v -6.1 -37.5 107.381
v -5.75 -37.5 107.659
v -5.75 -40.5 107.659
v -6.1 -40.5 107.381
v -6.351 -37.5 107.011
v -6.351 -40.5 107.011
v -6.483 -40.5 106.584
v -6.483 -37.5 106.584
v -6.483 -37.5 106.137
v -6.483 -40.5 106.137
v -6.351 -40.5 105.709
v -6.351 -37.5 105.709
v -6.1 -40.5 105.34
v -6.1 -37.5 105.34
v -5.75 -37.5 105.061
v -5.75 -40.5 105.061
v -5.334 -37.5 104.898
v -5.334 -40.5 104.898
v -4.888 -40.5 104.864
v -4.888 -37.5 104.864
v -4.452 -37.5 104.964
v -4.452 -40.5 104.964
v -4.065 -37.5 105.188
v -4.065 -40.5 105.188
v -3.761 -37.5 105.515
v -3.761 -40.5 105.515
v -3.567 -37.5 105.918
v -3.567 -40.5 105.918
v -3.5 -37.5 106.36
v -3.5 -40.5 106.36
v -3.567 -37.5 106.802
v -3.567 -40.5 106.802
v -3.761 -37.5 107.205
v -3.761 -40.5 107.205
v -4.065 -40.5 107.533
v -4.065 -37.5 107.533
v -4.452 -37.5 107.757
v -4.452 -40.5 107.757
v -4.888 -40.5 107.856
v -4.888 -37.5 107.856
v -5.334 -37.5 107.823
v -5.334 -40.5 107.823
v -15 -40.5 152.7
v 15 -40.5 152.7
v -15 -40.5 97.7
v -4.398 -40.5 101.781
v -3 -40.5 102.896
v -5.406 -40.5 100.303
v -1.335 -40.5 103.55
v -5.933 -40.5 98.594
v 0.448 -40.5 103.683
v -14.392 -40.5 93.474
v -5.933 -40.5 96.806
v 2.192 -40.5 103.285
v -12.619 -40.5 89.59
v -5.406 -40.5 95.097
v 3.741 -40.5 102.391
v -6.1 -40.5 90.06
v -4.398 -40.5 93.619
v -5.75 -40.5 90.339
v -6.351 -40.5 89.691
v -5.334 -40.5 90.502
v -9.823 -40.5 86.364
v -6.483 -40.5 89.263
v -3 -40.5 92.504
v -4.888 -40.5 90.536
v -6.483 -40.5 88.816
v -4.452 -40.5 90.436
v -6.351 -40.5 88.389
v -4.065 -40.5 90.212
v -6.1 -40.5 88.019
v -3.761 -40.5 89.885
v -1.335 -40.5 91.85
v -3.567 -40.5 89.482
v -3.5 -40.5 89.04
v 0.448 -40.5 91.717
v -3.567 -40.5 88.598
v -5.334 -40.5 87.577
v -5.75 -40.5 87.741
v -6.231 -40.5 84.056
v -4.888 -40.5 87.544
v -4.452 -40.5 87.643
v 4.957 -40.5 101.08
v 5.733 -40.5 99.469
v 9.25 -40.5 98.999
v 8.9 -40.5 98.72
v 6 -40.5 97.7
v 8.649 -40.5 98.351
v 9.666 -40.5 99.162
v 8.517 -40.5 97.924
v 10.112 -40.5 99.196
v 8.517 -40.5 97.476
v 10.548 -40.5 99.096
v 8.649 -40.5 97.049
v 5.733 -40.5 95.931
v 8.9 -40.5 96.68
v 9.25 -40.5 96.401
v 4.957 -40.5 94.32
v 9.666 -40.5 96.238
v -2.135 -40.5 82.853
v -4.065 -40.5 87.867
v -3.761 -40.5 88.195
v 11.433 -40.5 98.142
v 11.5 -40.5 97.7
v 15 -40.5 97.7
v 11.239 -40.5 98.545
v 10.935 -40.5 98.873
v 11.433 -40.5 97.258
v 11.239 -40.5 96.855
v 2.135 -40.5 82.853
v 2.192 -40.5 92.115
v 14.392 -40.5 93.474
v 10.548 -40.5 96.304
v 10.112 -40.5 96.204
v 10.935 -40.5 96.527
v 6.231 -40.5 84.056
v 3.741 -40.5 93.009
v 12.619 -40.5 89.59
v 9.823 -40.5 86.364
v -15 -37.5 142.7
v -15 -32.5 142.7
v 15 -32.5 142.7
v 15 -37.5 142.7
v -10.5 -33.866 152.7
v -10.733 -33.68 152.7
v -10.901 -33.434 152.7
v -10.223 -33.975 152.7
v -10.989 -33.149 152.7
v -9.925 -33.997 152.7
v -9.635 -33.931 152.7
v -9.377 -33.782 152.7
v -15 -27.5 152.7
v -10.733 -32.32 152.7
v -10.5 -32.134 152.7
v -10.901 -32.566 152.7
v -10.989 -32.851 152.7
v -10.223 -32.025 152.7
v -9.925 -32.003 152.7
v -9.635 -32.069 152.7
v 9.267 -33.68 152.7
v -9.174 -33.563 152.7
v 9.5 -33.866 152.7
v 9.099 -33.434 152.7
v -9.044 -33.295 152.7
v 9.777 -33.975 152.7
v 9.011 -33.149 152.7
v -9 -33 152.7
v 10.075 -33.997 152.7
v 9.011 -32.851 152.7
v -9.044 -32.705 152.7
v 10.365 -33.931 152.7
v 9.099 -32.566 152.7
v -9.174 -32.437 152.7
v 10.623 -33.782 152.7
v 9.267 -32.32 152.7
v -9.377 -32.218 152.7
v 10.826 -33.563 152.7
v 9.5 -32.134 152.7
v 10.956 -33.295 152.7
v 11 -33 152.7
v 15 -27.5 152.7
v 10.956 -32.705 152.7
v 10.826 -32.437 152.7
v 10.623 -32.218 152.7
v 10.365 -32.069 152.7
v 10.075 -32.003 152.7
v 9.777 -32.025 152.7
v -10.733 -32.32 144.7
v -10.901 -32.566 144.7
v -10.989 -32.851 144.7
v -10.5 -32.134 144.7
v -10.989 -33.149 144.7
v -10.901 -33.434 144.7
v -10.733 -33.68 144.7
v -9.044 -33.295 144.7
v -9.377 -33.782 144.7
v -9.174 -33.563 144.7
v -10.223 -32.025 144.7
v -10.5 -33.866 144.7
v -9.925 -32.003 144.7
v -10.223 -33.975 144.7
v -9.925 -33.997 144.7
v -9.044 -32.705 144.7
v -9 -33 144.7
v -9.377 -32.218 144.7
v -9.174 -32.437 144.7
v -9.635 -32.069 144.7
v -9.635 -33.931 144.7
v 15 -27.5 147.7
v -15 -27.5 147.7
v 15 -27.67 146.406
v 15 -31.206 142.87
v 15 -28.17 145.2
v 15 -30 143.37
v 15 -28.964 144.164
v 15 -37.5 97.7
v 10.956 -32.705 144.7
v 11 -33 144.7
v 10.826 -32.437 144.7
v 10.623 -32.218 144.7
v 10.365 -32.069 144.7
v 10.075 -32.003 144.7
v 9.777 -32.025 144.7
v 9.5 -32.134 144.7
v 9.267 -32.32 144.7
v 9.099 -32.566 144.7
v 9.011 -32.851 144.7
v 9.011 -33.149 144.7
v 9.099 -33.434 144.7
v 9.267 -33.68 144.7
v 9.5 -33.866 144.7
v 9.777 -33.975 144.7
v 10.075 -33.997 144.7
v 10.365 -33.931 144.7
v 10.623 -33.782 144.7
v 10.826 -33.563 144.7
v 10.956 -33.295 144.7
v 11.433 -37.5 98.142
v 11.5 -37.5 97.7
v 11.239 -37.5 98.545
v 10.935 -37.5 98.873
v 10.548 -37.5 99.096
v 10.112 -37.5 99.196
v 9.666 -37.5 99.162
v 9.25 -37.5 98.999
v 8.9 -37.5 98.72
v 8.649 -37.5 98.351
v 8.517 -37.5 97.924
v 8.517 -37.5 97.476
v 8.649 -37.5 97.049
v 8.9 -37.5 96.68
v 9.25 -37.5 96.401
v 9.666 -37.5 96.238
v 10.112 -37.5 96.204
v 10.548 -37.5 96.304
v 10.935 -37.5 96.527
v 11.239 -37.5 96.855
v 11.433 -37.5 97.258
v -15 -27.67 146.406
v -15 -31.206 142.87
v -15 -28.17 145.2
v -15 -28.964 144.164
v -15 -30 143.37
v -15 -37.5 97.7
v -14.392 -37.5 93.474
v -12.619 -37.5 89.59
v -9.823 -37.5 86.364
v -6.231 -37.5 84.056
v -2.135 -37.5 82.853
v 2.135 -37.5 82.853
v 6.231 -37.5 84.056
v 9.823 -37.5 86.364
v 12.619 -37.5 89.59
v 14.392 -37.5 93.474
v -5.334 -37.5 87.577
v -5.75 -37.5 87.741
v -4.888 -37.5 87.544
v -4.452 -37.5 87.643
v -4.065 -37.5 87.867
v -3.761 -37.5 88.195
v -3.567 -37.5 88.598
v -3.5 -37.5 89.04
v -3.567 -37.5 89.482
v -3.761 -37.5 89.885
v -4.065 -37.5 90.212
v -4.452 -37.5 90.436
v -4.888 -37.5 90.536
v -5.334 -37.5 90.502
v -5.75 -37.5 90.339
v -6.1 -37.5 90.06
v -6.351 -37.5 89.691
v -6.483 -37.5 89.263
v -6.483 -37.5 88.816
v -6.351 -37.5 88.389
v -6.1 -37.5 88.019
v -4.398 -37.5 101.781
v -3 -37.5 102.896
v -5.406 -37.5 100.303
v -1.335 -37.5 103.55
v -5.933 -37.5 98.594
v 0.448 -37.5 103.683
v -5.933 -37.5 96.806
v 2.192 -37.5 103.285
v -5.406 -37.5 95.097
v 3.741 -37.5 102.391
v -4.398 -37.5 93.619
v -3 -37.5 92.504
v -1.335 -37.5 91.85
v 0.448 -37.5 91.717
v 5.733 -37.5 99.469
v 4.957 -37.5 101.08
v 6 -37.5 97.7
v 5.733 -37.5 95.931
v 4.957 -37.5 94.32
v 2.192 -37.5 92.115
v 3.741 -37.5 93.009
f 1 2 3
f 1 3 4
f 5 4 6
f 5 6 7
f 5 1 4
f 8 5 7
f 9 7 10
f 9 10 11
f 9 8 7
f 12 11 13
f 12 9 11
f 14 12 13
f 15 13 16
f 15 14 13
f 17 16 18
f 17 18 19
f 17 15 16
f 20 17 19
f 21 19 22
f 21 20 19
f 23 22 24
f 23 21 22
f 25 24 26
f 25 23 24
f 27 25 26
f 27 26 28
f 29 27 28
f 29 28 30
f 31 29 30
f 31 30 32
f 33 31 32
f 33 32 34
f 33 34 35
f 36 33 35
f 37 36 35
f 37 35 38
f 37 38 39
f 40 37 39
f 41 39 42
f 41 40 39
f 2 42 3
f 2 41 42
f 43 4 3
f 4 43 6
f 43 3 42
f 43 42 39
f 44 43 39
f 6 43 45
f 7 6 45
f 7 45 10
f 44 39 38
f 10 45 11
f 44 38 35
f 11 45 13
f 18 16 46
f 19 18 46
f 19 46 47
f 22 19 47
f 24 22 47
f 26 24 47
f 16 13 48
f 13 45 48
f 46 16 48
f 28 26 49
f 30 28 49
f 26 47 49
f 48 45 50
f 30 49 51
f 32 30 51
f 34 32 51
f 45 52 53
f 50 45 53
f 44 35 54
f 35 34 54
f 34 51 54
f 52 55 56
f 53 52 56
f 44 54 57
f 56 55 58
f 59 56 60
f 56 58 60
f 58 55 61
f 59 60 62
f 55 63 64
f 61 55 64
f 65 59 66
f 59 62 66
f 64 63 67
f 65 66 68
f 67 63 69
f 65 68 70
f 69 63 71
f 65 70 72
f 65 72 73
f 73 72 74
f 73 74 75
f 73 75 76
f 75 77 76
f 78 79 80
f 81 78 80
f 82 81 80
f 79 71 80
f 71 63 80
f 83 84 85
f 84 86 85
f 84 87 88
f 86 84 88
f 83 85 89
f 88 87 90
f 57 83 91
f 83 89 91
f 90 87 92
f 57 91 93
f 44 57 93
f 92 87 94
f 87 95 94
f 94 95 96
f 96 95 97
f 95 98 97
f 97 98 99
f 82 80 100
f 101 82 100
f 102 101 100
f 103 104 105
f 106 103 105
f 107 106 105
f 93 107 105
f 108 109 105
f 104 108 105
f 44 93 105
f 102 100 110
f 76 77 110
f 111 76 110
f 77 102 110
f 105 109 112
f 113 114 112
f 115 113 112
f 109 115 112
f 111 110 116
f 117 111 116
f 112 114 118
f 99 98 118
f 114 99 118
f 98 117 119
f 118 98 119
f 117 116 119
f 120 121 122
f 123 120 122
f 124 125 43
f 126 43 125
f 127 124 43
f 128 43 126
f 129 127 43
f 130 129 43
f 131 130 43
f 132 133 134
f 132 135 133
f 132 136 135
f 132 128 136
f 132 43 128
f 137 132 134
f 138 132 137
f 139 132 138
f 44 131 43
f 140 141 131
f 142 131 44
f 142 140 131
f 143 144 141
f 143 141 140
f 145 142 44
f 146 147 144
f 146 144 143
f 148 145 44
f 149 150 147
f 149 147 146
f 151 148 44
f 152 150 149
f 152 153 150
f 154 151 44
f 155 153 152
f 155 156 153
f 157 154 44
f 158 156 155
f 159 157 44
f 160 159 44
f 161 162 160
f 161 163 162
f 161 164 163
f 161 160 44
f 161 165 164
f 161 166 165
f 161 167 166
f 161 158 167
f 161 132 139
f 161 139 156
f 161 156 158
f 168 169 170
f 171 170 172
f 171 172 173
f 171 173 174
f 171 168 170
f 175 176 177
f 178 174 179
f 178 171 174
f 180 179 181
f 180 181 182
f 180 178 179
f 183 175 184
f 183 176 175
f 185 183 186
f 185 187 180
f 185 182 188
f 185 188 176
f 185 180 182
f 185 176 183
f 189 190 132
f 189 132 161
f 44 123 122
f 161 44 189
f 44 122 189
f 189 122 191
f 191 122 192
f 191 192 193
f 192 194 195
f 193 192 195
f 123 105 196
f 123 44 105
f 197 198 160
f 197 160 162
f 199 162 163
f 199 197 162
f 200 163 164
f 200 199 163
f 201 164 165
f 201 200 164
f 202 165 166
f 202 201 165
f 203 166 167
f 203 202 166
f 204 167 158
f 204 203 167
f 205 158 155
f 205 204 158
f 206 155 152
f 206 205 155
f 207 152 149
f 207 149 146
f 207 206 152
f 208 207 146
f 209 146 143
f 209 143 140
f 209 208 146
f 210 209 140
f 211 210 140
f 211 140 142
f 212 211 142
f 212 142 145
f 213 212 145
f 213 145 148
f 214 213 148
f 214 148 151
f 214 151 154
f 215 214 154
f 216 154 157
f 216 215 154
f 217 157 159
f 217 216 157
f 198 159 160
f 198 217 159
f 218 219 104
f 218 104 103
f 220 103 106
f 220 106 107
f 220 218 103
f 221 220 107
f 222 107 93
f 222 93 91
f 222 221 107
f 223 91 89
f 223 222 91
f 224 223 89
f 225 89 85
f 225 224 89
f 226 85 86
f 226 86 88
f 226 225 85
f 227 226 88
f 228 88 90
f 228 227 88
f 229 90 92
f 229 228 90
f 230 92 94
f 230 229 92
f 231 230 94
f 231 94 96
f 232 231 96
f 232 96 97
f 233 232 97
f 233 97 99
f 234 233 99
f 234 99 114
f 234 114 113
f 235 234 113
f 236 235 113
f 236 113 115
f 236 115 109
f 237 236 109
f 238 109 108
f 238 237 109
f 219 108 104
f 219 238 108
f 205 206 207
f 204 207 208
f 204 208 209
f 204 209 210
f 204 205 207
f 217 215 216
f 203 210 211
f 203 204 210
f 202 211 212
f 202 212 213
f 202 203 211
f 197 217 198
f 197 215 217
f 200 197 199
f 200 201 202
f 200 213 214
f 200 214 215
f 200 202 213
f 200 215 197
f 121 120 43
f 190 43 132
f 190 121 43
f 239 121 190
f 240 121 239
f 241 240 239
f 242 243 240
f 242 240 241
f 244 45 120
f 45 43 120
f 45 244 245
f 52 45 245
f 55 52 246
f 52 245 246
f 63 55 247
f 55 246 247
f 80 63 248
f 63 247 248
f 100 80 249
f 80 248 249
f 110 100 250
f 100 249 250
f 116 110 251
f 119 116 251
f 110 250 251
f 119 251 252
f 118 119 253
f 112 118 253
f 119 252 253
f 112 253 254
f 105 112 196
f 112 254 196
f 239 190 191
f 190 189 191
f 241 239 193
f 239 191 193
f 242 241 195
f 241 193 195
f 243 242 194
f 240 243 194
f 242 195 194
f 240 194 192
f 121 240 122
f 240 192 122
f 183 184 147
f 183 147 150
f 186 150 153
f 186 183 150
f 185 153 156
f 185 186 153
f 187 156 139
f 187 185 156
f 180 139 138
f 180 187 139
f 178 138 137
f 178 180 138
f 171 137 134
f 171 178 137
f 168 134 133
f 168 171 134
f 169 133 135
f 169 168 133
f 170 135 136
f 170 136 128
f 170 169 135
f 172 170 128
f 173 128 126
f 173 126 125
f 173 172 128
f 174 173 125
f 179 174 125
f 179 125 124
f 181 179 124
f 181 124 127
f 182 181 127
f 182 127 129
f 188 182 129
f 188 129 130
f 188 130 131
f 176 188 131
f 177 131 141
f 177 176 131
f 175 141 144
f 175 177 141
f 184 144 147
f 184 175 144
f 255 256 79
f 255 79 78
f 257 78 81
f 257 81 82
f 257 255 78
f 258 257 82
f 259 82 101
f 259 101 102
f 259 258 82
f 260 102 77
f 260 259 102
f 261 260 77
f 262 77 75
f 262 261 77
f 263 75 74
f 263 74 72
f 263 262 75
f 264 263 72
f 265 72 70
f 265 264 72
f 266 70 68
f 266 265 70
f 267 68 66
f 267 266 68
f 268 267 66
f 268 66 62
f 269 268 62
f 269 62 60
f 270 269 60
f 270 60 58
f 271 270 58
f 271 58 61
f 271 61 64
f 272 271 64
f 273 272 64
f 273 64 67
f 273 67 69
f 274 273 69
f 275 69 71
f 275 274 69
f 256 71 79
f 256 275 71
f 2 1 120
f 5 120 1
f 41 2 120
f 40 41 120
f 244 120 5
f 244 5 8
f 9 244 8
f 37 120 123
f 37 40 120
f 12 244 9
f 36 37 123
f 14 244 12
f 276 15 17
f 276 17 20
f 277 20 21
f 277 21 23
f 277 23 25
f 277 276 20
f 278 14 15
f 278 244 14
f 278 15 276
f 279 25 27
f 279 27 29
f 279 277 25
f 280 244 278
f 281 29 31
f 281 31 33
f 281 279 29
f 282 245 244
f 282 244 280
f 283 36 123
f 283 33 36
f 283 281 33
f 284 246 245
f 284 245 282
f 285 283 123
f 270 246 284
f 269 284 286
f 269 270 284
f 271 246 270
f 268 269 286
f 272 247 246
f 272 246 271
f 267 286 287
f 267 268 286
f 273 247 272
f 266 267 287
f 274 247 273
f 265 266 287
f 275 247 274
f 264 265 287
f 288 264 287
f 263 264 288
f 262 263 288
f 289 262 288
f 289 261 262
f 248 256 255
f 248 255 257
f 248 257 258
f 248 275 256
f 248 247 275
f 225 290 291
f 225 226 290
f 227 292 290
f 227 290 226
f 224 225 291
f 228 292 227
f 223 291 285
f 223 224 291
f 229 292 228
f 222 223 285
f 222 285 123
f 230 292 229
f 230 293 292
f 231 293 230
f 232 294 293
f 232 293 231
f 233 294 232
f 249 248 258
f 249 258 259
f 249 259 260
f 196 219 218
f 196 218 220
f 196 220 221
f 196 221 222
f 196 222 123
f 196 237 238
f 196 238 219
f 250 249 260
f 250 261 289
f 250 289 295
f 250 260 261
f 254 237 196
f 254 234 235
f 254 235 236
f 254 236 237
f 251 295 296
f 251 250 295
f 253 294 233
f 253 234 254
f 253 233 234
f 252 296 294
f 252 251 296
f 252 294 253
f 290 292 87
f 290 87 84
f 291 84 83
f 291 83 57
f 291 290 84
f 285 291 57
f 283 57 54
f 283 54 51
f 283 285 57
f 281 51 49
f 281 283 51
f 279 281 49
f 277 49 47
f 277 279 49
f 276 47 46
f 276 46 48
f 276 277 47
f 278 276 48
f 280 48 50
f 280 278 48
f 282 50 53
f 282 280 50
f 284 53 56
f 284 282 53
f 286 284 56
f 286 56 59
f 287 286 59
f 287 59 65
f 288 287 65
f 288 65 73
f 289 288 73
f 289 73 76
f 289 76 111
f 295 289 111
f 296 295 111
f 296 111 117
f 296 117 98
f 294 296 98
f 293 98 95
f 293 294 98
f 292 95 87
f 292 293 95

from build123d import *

# Parameters (mm, degrees)
CYLINDER037_R     = 1
CYLINDER037_DEPTH = 8
CYLINDER033_R     = 6
CYLINDER033_DEPTH = 3
CYLINDER034_R     = 1.5
CYLINDER034_DEPTH = 3
ARRAY007_COUNT    = 3
CYLINDER036_R     = 1
CYLINDER036_DEPTH = 8
BOX003_W          = 30
BOX003_H          = 3
BOX003_DEPTH      = 55
BOX005_W          = 30
BOX005_H          = 10
BOX005_DEPTH      = 10
FILLET003_R       = 5
CYLINDER032_R     = 15
CYLINDER032_DEPTH = 3


with BuildPart() as payload_plate_screw002:
    # Cylinder037 → Cylinder037 (new body)
    with BuildSketch(Plane(origin=(-10, -33, 144.7), x_dir=(1, 0, 0), z_dir=(0, 0, 1))):
        Circle(CYLINDER037_R)
    extrude(amount=CYLINDER037_DEPTH)


with BuildPart() as arm_bottom_arc_axis_clearance:
    # Cylinder033 → Cylinder033 (new body)
    with BuildSketch(Plane(origin=(0, -37.5, 97.7), x_dir=(1, 0, 0), z_dir=(0, -1, 0))):
        Circle(CYLINDER033_R)
    extrude(amount=CYLINDER033_DEPTH)


with BuildPart() as arm_screw_holes:
    # Cylinder034 → Cylinder034 (new body)
    with BuildSketch(Plane(origin=(10, -37.5, 97.7), x_dir=(1, 0, 0), z_dir=(0, -1, 0))):
        Circle(CYLINDER034_R)
    extrude(amount=CYLINDER034_DEPTH)

    # Array007: arm-screw-holes ×3 about axis
    array007_axis = Axis((0, 0, 97.7), (0, 1, 0))


with BuildPart() as arm_screw_holes_1:
    add(arm_screw_holes.part)
    for i in range(1, ARRAY007_COUNT):
        add(arm_screw_holes.part.rotate(array007_axis, i * 360 / ARRAY007_COUNT))


with BuildPart() as arm_payload_plate_screw_holes:
    # Cylinder036 → Cylinder036 (new body)
    with BuildSketch(Plane(origin=(10, -33, 144.7), x_dir=(1, 0, 0), z_dir=(0, 0, 1))):
        Circle(CYLINDER036_R)
    extrude(amount=CYLINDER036_DEPTH)

    # Compound: union payload-plate-screw002, arm-bottom-arc-axis-clearance, arm-screw-holes
    add(payload_plate_screw002.part)
    add(arm_bottom_arc_axis_clearance.part)
    add(arm_screw_holes_1.part)


with BuildPart() as arm:
    # Box003 → Box003 (new body)
    with BuildSketch(Plane(origin=(-15, -40.5, 97.7), x_dir=(1, 0, 0), z_dir=(0, 0, 1))):
        with Locations((15, 1.5)):
            Rectangle(BOX003_W, BOX003_H)
    extrude(amount=BOX003_DEPTH)


with BuildPart() as arm_screw_block_with_fillet:
    # Box005 → Box005 (new body)
    with BuildSketch(Plane(origin=(-15, -37.5, 142.7), x_dir=(1, 0, 0), z_dir=(0, 0, 1))):
        with Locations((15, 5)):
            Rectangle(BOX005_W, BOX005_H)
    extrude(amount=BOX005_DEPTH)

    # Fillet003
    fillet003_edges = [arm_screw_block_with_fillet.edges().sort_by_distance(p)[0] for p in [
        (0, -27.5, 142.7),
    ]]
    fillet(fillet003_edges, radius=FILLET003_R)


with BuildPart() as tilt_arm:
    # Cylinder032 → Cylinder032 (new body)
    with BuildSketch(Plane(origin=(0, -37.5, 97.7), x_dir=(1, 0, 0), z_dir=(0, -1, 0))):
        Circle(CYLINDER032_R)
    extrude(amount=CYLINDER032_DEPTH)

    # Fusion015: union arm, arm-screw-block-with-fillet
    add(arm.part)
    add(arm_screw_block_with_fillet.part)

    # Cut026: cut arm-payload-plate-screw-holes
    add(arm_payload_plate_screw_holes.part, mode=Mode.SUBTRACT)


solid = tilt_arm.part
